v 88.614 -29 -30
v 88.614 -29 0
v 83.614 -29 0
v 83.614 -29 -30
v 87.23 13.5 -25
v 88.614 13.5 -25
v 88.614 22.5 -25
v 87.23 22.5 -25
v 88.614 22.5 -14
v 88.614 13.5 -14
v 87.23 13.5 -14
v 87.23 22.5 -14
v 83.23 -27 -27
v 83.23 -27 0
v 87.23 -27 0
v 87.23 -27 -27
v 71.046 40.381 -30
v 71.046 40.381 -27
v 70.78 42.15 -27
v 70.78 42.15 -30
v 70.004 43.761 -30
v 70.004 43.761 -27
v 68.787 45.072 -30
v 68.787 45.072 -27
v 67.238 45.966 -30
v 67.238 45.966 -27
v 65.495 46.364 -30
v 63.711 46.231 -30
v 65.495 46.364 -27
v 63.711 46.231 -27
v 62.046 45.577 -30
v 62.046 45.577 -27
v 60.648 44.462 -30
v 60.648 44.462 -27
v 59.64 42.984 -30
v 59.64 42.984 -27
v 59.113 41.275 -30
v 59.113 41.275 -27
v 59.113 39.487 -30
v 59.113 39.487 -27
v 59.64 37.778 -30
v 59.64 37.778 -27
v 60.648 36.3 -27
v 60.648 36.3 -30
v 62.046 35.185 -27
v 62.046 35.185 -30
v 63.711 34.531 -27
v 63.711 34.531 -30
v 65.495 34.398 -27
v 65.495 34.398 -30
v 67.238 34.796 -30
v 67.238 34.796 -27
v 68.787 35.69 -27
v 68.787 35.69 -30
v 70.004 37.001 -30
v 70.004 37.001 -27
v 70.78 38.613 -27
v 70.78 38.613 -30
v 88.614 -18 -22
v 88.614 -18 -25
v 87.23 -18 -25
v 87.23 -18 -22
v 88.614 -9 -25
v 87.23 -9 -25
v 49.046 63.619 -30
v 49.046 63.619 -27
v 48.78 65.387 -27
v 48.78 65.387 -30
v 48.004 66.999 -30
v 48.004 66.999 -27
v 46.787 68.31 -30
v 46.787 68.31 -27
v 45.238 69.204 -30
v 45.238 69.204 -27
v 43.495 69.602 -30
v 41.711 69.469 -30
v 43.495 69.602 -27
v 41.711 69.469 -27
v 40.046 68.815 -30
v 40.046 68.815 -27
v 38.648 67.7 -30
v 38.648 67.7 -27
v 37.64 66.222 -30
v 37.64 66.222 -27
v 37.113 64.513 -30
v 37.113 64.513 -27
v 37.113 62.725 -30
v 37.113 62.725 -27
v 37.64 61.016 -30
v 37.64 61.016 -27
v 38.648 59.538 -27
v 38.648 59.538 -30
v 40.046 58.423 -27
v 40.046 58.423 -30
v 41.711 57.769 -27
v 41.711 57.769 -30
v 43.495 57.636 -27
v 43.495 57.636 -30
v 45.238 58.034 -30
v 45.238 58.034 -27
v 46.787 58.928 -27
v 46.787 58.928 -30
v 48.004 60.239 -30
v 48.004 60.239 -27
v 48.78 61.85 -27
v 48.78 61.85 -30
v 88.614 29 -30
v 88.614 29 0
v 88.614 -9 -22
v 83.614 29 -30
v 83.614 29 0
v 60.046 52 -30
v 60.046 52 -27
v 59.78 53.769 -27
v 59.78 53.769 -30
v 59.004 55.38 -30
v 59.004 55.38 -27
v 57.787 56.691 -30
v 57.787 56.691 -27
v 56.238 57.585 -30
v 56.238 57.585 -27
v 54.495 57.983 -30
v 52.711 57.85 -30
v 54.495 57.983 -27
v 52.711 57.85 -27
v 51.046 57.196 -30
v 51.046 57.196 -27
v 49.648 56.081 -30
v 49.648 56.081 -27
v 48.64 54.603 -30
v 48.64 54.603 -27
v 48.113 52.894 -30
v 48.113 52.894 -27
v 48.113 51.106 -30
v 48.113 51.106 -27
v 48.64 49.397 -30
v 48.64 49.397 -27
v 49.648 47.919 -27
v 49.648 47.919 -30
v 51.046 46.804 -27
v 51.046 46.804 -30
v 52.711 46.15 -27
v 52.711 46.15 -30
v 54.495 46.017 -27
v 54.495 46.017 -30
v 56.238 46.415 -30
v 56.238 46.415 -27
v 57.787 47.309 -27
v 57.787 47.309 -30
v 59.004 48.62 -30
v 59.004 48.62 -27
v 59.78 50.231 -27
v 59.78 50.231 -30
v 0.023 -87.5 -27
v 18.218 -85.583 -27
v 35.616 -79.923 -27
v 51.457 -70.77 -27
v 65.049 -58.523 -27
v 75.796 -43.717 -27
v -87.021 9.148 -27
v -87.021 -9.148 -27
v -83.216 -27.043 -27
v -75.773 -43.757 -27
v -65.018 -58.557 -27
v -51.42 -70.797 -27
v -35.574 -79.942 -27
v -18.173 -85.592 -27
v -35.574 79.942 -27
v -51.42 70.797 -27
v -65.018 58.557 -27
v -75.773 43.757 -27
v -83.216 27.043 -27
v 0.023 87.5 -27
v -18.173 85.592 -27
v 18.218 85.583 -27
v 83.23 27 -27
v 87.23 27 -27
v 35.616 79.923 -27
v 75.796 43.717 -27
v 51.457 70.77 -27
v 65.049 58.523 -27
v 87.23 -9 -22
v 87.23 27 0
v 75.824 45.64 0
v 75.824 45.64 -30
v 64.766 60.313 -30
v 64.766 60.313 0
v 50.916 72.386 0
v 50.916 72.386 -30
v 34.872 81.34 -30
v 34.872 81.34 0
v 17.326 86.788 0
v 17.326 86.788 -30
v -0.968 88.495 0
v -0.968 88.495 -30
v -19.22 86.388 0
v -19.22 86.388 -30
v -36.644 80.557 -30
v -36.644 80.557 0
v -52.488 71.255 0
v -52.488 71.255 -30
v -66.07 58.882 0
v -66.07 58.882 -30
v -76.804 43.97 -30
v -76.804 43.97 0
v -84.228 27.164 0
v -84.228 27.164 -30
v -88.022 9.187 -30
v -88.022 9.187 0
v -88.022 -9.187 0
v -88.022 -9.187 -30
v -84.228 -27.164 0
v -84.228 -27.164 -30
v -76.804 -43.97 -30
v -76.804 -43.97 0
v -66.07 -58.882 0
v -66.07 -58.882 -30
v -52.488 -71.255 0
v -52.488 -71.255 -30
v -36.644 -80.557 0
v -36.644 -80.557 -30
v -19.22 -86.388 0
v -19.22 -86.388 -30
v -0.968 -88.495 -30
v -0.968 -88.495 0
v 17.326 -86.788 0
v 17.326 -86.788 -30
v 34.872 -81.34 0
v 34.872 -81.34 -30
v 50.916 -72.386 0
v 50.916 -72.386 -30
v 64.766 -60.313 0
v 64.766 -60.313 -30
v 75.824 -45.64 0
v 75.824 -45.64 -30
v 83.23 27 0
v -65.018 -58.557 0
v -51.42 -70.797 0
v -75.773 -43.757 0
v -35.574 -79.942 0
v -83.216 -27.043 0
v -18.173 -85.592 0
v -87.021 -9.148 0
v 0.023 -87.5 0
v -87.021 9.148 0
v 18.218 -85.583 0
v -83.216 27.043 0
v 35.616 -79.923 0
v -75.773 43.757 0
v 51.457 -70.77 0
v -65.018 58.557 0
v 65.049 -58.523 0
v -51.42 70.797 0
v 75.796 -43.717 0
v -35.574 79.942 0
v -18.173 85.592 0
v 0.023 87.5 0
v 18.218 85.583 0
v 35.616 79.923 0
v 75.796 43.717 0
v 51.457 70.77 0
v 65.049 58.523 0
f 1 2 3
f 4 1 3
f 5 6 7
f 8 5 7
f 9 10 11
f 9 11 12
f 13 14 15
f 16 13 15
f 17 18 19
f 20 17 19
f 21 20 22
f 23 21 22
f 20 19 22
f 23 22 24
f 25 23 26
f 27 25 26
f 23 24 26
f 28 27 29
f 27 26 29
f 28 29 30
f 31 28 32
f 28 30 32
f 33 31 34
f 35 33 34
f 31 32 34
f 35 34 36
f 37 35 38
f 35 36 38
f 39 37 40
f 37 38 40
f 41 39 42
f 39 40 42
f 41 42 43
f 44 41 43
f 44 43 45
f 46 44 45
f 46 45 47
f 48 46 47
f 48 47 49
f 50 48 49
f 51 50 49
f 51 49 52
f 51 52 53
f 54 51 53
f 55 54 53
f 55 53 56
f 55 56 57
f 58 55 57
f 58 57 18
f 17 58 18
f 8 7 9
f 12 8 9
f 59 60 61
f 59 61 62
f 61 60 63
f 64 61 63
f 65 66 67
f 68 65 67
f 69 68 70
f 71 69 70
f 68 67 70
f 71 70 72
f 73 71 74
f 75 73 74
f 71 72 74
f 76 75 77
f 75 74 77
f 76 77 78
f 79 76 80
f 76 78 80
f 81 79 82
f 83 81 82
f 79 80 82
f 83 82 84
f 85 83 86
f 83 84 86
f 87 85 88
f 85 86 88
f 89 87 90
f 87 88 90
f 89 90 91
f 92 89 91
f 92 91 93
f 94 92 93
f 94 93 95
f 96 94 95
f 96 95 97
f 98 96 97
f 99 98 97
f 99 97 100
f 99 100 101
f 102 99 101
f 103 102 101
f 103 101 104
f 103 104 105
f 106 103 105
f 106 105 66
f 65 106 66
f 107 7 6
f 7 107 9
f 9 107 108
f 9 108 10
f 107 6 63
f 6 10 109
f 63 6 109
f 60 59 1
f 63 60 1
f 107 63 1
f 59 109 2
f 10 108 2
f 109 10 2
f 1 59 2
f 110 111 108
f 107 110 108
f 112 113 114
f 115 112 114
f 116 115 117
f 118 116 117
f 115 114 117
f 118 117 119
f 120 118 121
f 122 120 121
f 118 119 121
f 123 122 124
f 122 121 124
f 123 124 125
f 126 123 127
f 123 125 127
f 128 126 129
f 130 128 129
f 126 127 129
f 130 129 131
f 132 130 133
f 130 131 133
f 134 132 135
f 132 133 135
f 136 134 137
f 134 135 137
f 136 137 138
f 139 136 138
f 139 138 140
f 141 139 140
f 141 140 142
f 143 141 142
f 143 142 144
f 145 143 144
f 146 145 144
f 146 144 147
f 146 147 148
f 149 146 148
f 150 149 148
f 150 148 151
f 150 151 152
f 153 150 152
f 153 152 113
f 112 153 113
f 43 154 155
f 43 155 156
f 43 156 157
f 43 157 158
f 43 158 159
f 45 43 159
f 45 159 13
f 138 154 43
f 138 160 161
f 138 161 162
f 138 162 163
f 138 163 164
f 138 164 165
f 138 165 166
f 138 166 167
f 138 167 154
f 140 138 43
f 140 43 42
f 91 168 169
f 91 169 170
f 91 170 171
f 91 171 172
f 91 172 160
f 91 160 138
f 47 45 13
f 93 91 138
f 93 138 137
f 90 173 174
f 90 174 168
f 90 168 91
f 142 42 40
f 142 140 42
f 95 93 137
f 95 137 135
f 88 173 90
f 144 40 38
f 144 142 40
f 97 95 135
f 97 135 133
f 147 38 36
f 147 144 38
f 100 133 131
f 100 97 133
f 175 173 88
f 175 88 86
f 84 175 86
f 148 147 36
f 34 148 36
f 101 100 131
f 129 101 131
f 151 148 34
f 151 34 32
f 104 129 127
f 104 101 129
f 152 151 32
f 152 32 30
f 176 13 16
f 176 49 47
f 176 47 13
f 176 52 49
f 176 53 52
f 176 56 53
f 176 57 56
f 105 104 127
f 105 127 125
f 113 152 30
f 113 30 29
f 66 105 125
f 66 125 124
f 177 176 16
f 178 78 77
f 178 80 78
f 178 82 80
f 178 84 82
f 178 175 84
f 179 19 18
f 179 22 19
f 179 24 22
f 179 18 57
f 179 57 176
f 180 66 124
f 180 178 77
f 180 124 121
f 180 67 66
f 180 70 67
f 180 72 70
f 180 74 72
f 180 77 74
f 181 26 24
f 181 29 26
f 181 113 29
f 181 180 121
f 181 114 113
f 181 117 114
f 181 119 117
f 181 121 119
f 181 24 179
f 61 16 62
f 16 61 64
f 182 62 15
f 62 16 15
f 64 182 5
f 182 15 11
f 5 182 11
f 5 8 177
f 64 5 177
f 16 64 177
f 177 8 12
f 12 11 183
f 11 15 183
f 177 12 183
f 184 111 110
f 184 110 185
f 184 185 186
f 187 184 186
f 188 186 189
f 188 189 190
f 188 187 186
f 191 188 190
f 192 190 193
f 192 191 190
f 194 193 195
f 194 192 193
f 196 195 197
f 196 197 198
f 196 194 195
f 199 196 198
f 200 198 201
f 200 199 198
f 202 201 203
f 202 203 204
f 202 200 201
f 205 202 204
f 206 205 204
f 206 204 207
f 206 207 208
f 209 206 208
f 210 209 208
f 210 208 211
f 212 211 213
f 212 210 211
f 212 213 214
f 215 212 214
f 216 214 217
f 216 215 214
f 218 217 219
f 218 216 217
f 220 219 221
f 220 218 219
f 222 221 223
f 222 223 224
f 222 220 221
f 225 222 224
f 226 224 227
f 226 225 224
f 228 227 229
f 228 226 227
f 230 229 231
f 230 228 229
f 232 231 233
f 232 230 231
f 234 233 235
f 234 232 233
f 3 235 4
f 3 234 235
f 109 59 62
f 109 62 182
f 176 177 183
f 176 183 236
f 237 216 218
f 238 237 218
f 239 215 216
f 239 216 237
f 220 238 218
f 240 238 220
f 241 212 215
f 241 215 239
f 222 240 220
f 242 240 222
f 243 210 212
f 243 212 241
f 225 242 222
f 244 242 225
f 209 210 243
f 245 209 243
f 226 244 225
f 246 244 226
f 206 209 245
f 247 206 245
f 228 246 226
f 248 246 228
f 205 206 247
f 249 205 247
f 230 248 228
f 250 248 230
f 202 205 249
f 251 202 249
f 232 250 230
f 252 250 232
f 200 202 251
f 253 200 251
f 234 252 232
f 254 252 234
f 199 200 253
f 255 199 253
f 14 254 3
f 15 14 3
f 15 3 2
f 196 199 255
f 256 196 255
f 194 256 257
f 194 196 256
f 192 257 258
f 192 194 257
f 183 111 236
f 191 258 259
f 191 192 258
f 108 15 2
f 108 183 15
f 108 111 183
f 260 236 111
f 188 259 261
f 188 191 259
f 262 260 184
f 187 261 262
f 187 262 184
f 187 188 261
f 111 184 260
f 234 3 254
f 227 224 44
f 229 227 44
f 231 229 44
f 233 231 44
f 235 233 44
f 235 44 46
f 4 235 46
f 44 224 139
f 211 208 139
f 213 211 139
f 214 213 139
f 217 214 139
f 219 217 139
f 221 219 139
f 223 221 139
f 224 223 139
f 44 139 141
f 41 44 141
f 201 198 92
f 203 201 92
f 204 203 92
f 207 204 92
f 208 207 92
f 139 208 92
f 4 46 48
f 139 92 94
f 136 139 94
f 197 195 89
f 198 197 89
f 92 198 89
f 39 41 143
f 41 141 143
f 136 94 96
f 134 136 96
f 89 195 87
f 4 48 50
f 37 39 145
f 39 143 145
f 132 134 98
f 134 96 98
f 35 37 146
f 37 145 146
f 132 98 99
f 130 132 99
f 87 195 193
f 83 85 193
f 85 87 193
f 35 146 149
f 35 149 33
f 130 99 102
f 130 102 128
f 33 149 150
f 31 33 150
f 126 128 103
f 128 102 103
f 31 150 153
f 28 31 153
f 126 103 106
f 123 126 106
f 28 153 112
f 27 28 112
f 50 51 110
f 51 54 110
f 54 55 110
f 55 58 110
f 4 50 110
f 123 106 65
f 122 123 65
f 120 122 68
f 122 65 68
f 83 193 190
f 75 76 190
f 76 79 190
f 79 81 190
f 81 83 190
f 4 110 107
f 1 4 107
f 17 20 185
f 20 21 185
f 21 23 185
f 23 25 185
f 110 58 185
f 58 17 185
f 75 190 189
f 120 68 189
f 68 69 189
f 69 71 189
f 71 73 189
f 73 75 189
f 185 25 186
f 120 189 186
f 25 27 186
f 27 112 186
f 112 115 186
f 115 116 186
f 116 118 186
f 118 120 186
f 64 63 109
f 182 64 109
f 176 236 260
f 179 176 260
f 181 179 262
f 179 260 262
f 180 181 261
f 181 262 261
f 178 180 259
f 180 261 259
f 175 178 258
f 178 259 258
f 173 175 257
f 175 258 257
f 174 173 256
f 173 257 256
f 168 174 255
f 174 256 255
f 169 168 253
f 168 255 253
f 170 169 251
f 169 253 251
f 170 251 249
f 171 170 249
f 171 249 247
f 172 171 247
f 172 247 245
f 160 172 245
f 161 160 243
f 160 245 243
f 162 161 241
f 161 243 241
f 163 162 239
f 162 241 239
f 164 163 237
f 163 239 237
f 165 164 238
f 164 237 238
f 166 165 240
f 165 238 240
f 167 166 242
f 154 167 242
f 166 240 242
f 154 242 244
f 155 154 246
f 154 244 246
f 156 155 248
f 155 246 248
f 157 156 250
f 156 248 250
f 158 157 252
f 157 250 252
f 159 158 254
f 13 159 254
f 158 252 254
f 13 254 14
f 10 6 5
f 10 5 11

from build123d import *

# Parameters (mm, degrees)
SKETCH007_R     = 6
PAD006_DEPTH    = 30
POCKET_DEPTH    = 27
SKETCH009_W     = 9
SKETCH009_H     = 11
SKETCH009_H_2   = 3
POCKET001_DEPTH = 2


with BuildPart() as part:
    # Sketch007 → Pad006 (new body)
    with BuildSketch(Plane.XY):
        with BuildLine():
            ThreePointArc((83.613695, 29), (-88.5, 0), (83.613695, -29))
            Line((88.613695, -29), (83.613695, -29))
            Line((88.613695, 29), (88.613695, -29))
            Line((83.613695, 29), (88.613695, 29))
        make_face()
        with Locations((43.046276, 63.61895)):
            Circle(SKETCH007_R, mode=Mode.SUBTRACT)
        with Locations((54.046276, 52)):
            Circle(SKETCH007_R, mode=Mode.SUBTRACT)
        with Locations((65.046276, 40.38105)):
            Circle(SKETCH007_R, mode=Mode.SUBTRACT)
    extrude(amount=-PAD006_DEPTH)

    # Sketch008 → Pocket (cut)
    with BuildSketch(Plane.XY):
        with BuildLine():
            ThreePointArc((83.230103, 27), (-87.5, 0), (83.230103, -27))
            Line((83.230103, -27), (87.230103, -27))
            Line((87.230103, -27), (87.230103, 27))
            Line((87.230103, 27), (83.230103, 27))
        make_face()
    extrude(amount=-POCKET_DEPTH, mode=Mode.SUBTRACT)

    # Sketch009 (on Face6 of Pocket) → Pocket001 (cut)
    with BuildSketch(Plane.YZ.offset(88.613695)):
        with Locations((18, -19.5)):
            Rectangle(SKETCH009_W, SKETCH009_H)
        with Locations((-13.5, -23.5)):
            Rectangle(SKETCH009_W, SKETCH009_H_2)
    extrude(amount=-POCKET001_DEPTH, mode=Mode.SUBTRACT)


solid = part.part
